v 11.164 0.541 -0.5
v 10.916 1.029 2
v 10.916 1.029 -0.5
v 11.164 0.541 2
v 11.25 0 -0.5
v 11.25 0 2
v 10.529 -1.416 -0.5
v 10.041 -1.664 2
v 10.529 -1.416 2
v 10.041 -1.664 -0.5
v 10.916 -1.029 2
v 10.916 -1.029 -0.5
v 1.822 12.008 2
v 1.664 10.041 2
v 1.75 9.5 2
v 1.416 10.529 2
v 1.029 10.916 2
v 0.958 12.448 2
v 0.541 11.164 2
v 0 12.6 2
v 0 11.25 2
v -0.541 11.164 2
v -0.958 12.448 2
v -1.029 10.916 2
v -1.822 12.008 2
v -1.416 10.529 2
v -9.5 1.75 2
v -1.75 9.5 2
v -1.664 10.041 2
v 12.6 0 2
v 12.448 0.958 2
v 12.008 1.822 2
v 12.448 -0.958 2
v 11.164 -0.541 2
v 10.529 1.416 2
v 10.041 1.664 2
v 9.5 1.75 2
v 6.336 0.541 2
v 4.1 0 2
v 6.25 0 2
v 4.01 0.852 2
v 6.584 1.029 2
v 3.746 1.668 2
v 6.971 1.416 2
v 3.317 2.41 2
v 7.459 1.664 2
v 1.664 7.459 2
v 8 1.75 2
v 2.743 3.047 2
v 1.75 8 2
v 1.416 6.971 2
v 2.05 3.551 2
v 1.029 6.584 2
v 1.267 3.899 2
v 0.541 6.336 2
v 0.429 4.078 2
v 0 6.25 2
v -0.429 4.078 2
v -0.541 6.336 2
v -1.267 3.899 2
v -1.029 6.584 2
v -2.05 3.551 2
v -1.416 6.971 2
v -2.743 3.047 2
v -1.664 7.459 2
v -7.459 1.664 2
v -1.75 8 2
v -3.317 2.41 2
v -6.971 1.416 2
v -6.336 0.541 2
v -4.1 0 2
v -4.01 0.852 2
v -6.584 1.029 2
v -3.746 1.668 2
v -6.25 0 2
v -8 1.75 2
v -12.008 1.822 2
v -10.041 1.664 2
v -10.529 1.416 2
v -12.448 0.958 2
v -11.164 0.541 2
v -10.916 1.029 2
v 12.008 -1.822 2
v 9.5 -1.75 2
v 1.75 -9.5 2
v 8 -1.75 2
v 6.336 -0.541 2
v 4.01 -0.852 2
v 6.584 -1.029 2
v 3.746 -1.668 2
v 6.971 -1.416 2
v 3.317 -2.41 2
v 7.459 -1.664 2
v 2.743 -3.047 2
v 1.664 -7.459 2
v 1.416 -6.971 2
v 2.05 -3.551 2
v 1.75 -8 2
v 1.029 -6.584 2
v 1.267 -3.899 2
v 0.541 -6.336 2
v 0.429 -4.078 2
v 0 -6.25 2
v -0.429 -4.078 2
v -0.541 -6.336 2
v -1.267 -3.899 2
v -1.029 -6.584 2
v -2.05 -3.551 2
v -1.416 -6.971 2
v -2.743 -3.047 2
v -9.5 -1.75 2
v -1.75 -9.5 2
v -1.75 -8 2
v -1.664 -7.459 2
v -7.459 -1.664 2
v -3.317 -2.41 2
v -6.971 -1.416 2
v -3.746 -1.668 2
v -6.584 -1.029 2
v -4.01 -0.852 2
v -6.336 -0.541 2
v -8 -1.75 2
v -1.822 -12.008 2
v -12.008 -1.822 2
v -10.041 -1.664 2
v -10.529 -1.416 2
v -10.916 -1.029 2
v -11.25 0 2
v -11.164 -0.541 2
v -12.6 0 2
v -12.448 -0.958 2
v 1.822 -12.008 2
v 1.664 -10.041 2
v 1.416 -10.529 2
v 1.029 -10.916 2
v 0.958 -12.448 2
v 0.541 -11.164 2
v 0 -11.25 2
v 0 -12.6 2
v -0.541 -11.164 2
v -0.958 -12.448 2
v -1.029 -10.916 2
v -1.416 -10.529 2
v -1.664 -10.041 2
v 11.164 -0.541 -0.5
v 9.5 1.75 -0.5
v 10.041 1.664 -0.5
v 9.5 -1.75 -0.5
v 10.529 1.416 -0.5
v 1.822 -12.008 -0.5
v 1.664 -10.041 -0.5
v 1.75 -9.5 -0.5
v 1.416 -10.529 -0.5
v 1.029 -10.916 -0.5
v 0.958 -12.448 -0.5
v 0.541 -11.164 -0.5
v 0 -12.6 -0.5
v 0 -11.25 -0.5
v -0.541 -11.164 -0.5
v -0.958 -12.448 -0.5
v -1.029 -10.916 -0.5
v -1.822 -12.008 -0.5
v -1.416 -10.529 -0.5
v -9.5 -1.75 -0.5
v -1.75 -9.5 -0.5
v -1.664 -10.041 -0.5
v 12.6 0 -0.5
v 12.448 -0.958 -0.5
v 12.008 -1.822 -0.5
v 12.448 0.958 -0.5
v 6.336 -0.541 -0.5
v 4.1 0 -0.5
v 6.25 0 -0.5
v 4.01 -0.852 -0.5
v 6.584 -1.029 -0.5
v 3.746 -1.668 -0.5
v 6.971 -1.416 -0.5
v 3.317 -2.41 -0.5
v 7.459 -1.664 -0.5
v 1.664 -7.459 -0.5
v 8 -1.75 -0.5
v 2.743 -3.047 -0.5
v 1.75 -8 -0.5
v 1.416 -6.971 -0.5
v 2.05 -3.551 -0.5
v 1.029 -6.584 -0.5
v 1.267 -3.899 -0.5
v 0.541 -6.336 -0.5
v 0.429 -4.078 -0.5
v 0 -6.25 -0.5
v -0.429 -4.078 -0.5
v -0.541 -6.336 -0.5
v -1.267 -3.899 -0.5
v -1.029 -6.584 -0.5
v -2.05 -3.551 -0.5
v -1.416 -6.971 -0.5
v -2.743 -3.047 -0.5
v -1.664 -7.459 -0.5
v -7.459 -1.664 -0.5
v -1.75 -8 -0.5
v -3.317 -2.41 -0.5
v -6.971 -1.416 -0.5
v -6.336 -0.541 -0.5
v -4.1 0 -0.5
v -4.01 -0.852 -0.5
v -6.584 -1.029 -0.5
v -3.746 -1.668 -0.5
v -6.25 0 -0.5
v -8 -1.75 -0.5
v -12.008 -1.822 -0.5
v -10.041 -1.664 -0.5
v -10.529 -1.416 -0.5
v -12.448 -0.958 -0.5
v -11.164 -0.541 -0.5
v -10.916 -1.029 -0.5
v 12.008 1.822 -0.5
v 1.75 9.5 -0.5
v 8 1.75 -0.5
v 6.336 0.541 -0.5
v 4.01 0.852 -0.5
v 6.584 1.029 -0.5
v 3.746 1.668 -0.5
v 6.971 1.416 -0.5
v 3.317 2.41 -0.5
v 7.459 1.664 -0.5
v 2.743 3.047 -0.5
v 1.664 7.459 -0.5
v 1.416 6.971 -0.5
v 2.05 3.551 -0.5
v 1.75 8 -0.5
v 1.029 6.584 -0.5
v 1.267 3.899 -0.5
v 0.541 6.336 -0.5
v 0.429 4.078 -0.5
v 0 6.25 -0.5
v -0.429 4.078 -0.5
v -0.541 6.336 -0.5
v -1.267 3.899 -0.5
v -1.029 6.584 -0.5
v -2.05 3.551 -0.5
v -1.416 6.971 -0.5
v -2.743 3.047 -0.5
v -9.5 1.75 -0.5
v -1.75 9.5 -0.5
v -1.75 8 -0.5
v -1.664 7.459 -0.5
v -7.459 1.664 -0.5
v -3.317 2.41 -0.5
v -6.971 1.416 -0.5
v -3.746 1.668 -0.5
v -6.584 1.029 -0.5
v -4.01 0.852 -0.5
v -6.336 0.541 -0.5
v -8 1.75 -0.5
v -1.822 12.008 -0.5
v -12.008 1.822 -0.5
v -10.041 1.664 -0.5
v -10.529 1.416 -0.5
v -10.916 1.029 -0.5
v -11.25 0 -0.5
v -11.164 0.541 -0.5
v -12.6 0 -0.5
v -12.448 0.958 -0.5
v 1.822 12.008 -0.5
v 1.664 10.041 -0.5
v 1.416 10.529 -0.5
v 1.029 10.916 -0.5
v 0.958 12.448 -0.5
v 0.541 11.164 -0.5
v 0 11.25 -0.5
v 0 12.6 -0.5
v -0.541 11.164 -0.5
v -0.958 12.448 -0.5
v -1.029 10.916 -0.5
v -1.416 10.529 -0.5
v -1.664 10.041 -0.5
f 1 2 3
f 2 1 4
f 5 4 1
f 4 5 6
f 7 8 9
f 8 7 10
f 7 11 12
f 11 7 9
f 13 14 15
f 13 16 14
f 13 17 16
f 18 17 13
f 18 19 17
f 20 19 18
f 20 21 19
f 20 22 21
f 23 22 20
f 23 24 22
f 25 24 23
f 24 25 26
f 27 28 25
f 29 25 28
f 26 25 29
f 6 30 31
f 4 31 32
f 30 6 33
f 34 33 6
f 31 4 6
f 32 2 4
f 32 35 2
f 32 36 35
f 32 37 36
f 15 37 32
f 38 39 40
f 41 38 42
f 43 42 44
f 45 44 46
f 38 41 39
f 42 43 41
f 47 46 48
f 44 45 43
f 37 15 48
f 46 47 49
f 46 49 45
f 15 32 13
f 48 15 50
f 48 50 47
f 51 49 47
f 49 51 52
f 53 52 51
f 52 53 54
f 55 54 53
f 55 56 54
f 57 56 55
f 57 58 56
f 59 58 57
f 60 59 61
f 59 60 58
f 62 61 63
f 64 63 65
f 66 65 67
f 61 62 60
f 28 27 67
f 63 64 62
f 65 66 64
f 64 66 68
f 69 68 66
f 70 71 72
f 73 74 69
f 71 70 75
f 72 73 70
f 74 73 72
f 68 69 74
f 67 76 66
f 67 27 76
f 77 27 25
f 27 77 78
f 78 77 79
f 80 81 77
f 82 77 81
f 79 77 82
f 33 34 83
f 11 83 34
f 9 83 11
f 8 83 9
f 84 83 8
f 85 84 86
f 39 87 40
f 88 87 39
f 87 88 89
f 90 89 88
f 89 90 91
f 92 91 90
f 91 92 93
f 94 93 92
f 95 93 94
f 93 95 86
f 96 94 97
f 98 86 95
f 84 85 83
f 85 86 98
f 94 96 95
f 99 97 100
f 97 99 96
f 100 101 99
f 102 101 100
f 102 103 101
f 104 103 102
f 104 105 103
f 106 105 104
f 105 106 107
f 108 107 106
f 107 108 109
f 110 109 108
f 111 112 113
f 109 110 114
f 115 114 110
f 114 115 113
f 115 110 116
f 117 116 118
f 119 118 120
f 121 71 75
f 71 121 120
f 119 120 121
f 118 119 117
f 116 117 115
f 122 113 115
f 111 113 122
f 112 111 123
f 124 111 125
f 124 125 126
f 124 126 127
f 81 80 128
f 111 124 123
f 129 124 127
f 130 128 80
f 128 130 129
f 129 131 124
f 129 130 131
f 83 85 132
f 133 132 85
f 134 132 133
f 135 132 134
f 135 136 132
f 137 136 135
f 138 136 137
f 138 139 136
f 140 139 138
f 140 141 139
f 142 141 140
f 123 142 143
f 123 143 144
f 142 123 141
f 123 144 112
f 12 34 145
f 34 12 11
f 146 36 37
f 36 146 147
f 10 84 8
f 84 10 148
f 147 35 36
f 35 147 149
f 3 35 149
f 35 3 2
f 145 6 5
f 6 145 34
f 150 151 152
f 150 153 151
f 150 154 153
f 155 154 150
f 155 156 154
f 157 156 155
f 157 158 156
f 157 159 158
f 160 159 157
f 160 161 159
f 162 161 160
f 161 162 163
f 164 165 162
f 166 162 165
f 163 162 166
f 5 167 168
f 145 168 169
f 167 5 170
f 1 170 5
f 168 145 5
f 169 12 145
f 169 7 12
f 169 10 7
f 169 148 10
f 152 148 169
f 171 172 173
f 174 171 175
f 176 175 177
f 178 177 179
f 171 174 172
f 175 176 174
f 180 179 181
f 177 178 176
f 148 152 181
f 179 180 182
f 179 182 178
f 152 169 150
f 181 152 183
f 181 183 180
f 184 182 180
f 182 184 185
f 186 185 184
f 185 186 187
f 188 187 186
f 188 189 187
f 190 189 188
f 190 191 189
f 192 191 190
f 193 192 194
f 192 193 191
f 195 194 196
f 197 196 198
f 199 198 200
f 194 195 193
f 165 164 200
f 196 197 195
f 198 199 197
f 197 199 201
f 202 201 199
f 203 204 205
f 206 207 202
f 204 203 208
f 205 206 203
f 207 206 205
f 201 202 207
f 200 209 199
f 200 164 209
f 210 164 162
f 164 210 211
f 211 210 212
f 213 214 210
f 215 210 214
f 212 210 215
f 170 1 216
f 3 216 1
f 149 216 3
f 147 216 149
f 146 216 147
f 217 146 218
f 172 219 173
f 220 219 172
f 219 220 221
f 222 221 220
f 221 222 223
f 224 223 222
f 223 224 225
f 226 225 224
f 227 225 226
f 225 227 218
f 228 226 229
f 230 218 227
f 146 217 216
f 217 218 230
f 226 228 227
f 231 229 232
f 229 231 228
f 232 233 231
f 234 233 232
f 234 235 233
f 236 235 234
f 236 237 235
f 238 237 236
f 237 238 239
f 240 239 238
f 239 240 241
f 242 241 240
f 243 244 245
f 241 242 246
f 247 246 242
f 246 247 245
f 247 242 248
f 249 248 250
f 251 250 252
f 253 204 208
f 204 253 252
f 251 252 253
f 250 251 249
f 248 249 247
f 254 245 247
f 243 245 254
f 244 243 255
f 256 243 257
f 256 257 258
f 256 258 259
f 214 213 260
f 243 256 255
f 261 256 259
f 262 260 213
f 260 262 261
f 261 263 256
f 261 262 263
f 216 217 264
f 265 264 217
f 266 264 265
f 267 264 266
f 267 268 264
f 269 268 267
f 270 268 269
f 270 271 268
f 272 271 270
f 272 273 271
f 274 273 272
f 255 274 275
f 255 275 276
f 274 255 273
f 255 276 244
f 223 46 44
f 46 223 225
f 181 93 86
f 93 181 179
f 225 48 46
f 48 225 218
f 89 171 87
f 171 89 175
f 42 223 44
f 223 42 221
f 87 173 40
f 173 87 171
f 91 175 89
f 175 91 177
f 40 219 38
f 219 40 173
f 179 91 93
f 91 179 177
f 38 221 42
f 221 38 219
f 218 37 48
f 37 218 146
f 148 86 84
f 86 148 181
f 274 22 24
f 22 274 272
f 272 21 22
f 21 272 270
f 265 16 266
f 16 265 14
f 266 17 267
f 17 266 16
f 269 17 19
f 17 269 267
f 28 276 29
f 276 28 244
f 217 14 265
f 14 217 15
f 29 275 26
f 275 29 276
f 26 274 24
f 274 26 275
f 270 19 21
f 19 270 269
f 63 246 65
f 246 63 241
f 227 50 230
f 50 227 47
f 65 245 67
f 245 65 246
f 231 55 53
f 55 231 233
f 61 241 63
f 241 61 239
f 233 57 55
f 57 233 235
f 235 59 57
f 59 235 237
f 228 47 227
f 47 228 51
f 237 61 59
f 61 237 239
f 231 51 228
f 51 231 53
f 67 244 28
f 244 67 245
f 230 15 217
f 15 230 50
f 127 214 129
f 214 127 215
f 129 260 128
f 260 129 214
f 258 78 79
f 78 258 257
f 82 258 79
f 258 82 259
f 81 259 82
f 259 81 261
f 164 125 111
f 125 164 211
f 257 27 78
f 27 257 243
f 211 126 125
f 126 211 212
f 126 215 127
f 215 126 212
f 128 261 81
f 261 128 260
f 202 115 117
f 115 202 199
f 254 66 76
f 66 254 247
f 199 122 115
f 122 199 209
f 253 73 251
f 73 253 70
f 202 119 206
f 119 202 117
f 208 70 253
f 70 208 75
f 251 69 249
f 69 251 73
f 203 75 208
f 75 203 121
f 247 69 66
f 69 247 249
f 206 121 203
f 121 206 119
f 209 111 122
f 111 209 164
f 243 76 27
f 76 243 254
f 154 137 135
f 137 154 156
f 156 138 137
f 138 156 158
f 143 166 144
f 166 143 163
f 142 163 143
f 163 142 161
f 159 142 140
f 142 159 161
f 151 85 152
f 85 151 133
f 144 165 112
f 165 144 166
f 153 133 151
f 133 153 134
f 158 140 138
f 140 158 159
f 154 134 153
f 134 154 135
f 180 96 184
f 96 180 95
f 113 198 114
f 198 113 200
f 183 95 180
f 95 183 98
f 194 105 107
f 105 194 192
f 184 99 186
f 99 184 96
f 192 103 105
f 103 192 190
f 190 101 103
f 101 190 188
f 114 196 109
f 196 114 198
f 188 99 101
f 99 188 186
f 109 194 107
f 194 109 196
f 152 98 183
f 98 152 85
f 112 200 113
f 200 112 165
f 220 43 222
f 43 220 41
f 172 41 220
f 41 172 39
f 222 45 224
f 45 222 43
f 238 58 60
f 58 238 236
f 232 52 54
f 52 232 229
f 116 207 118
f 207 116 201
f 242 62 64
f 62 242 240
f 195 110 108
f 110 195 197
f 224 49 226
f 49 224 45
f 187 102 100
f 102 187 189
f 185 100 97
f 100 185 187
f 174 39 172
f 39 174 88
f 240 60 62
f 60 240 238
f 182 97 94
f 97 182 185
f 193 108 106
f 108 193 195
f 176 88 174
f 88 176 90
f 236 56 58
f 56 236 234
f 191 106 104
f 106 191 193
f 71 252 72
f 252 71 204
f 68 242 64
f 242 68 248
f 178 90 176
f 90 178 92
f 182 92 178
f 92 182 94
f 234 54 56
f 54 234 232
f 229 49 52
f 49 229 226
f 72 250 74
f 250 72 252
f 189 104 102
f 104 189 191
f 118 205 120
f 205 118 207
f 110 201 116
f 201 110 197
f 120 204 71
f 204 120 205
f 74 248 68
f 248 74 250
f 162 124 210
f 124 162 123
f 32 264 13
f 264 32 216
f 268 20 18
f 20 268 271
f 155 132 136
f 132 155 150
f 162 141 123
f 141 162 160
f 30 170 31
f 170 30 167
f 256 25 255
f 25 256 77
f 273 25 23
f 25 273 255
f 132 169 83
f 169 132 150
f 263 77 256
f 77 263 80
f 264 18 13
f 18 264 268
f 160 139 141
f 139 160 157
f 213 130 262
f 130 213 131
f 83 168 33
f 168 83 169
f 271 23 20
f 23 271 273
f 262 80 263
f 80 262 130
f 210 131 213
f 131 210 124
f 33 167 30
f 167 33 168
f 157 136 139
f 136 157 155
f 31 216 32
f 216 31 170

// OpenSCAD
// file: dronePlates.scad
/**
 * dronePlates.scad
 * Plate library
 *
 * GNU GPL V3
 * @author: Victor Potenciano
 */

m3Rad = 3.4/2;
cornerR = 4;

/**
 *
 */
module helperDisk(diameter) {
	cylinder(r = diameter/2, h = 0.6, $fn=20);
}

/**
 *
 */
module roundedRect(size, radius) {
	x = size[0];
	y = size[1];
	z = size[2];

	linear_extrude(height=z)
	hull() {
	// place 4 circles in the corners, with the given radius
	translate([(-x/2)+(radius/2), (-y/2)+(radius/2), 0]){ circle(r=radius); }
	translate([(x/2)-(radius/2), (-y/2)+(radius/2), 0]){ circle(r=radius); }
	translate([(-x/2)+(radius/2), (y/2)-(radius/2), 0]){ circle(r=radius); }
	translate([(x/2)-(radius/2), (y/2)-(radius/2), 0]){ circle(r=radius); }
	}
}

/**
 * rounded rectangle triangle with corner at origin
 */
module roundedTriangle(size, radius) {
	x = size[0];
	y = size[1];
	z = size[2];

	linear_extrude(height=z)
	hull() {
	translate([radius, radius, 0]){ circle(r=radius); }
	translate([x-radius, radius, 0]){ circle(r=radius); }
	translate([radius, y-radius, 0]){ circle(r=radius); }
	}
}

/**
 *
 */
module roundRectPlate(w, l, plateThick=3) {
	difference(){
		roundedRect([l+m3Rad*1.75,w+m3Rad*1.75,plateThick], cornerR);
		translate([l/2, w/2, -0.5]) { cylinder(h = plateThick+1, r = m3Rad, $fn=30); }
		translate([-l/2, w/2, -0.5]) { cylinder(h = plateThick+1, r = m3Rad, $fn=30); }
		translate([l/2, -w/2, -0.5]) { cylinder(h = plateThick+1, r = m3Rad, $fn=30); }
		translate([-l/2, -w/2, -0.5]) { cylinder(h = plateThick+1, r = m3Rad, $fn=30); }
	}
}

/**
 *
 */
module crossSquarePlate(l, thick=3) {
	inDist = cornerR*2+4;
	trianL = sqrt((l*l)/2)-inDist;
	centerR = 4;

	difference(){
		roundRectPlate(l, l, thick);
		translate([0, centerR, -0.5]) { 
			rotate([0,0,45]){ roundedTriangle([trianL,trianL,thick+1], cornerR-2); }
		}
		translate([0, -centerR, -0.5]) { 
			rotate([0,0,225]){ roundedTriangle([trianL,trianL,thick+1], cornerR-2); }
		}
		translate([-centerR, 0, -0.5]) { 
			rotate([0,0,135]){ roundedTriangle([trianL,trianL,thick+1], cornerR-2); }
		}
		translate([centerR, 0, -0.5]) { 
			rotate([0,0,-45]){ roundedTriangle([trianL,trianL,thick+1], cornerR-2); }
		}
	}
}

/**
 *
 */
module hShapePlate(w, l, thick=4) {
	inDist = cornerR*2+1;

	difference(){
		roundRectPlate(w, l, thick);
		translate([0, w/4, -0.5]) { roundedRect([l-inDist,w/2-inDist,thick+1], cornerR-2); }
		translate([0, -w/4, -0.5]) { roundedRect([l-inDist,w/2-inDist,thick+1], cornerR-2); }
	}
}

/**
 *
 */
module motorCircleMount(inDia, outDia, thick=3, extraH=false, d1=19, d2=16, holeR=m3Rad ) {
	difference(){
		cylinder(h = thick, r = outDia/2, $fn=30);
		motorCircleMountHoles(inDia, outDia, thick, extraH, d1=d1, d2=d2, holeR=holeR);
	}
}

/**
 *
 */
module motorCircleMountHoles(inDia, outDia, thick=3, extraH=false, d1=19, d2=16, d3=25, holeR=m3Rad) {
	translate([0, 0, -0.5]) { cylinder(h = thick+1, r = inDia/2, $fn=30); }

	for(i=[0:3]) {
		rotate([0,0,90*i]){
		translate([d1/2, 0, -0.5]) cylinder(h = thick+1, r = holeR, $fn=20);
		translate([d2/2, 0, -0.5]) cylinder(h = thick+1, r = holeR, $fn=20);
		translate([d2/2, -holeR, -0.5]) cube(size = [(d1-d2)/2,holeR*2,thick+1]);
		}
	}
	
	if(extraH==true){	
		for(i=[-1,1]) translate([i*d3/2, 0, -0.5]) { cylinder(h = thick+1, r = holeR, $fn=30); }
	}
}

/**
 *
 */
module motorRectMount(w, l, inDia, thick=3) {
	d1=19;
	d2=16;

	difference(){
		roundRectPlate(w, l, thick);
		translate([0, 0, -0.5]) { cylinder(h = thick+1, r = inDia/2, $fn=30); }
		translate([0, d1/2, -0.5]) { cylinder(h = thick+1, r = m3Rad, $fn=30); }
		translate([0, -d1/2, -0.5]) { cylinder(h = thick+1, r = m3Rad, $fn=30); }
		translate([d2/2, 0, -0.5]) { cylinder(h = thick+1, r = m3Rad, $fn=30); }
		translate([-d2/2, 0, -0.5]) { cylinder(h = thick+1, r = m3Rad, $fn=30); }
	}
}

/**
 *
 */
module tube(inDia, outDia, height) {
	difference(){
		cylinder(h = height, r = outDia/2, $fn=50);
		translate([0, 0, -0.5]) { cylinder(h = height+1, r = inDia/2, $fn=30); }
	}
}

/**
 *
 */
module squareTube(inDia, outDia, height) {
	translate([0,0,height/2]){
	difference(){
		cube(size = [outDia,outDia,height], center = true);
		cube(size = [inDia,inDia,height+1], center = true);
	}
	}
}

/**
 *
 */
module djiFlamewheelHoles(height) {
	a = 23;
	b = 16;
	c = 19.5;
	
	translate([a/2, c/2, 0]) { cylinder(h = height, r = m3Rad, $fn=30); }
	translate([-a/2, c/2, 0]) { cylinder(h = height, r = m3Rad, $fn=30); }
	translate([b/2, -c/2, 0]) { cylinder(h = height, r = m3Rad, $fn=30); }
	translate([-b/2, -c/2, 0]) { cylinder(h = height, r = m3Rad, $fn=30); }
}

/**
 *
 */
module djiFlamewheelHolesBotton(height) {
	a1 = 21;
	c = 19.5;
	
	translate([a1/2, c/2, 0]) { cylinder(h = height, r = m3Rad, $fn=30); }
	translate([-a1/2, c/2, 0]) { cylinder(h = height, r = m3Rad, $fn=30); }
}

/**
 *
 */
module propeller(size){
union(){
difference(){
	cylinder(h = 3, r = size/2, center=true, $fn=30);
	cylinder(h = 3.1, r = size/2-2, center=true, $fn=30); 
}
for( i = [-1,1] ){
rotate([0,0,45*i]){ cube(size = [size,4,1], center = true); }
}
}
}

/**
 *
 */
module slot(length, height, rad){
for(i=[-1,1]) translate([i*length/2,0,0]) cylinder(h = height, r = rad, $fn=30);
translate([0,0,height/2]) cube(size = [length,rad*2,height], center = true);
}

 

////////////////////////
// Examples:
////////////////////////

motorCircleMount(8, 25, 3.5);

//roundedRect([50,50,3], 4);

//hShapePlate(79, 25);

//rotate([0,0,45]){roundedTriangle([40,40,3], 4);}

//crossSquarePlate(45, 4);

/*
union(){
motorRectMount(21, 18, 8, 4);
translate([9, 10.5, 0]) {tube(m3Rad*2, 6.5, 6);}
}
*/

/*
difference(){
union(){
hShapePlate(50, 30, 3.5);
translate([-4,-25,0]){cube(size = [8,50,3.5]);}
rotate([0, 0, 45]) {motorCircleMount(8, 35, 3.5);}
}
cylinder(h = 10, r = 4, $fn=100, center=true);
}
*/

//rotate([90,0,0]){ tube(5,10,20); }
//translate([20,0,0]){ squareTube(5, 10, 20); }
// main file
use <dronePlates.scad>


m3Rad = 3.5/2;


difference(){

hull(){
motorCircleMountHoles(8, 21, thick=1.5, extraH=false, d1=19, d2=16, d3=25, holeR=3.1);
}

motorCircleMountHoles(8.2, 21, thick=1.5, extraH=false, d1=19, d2=16, d3=25, holeR=m3Rad);

}
